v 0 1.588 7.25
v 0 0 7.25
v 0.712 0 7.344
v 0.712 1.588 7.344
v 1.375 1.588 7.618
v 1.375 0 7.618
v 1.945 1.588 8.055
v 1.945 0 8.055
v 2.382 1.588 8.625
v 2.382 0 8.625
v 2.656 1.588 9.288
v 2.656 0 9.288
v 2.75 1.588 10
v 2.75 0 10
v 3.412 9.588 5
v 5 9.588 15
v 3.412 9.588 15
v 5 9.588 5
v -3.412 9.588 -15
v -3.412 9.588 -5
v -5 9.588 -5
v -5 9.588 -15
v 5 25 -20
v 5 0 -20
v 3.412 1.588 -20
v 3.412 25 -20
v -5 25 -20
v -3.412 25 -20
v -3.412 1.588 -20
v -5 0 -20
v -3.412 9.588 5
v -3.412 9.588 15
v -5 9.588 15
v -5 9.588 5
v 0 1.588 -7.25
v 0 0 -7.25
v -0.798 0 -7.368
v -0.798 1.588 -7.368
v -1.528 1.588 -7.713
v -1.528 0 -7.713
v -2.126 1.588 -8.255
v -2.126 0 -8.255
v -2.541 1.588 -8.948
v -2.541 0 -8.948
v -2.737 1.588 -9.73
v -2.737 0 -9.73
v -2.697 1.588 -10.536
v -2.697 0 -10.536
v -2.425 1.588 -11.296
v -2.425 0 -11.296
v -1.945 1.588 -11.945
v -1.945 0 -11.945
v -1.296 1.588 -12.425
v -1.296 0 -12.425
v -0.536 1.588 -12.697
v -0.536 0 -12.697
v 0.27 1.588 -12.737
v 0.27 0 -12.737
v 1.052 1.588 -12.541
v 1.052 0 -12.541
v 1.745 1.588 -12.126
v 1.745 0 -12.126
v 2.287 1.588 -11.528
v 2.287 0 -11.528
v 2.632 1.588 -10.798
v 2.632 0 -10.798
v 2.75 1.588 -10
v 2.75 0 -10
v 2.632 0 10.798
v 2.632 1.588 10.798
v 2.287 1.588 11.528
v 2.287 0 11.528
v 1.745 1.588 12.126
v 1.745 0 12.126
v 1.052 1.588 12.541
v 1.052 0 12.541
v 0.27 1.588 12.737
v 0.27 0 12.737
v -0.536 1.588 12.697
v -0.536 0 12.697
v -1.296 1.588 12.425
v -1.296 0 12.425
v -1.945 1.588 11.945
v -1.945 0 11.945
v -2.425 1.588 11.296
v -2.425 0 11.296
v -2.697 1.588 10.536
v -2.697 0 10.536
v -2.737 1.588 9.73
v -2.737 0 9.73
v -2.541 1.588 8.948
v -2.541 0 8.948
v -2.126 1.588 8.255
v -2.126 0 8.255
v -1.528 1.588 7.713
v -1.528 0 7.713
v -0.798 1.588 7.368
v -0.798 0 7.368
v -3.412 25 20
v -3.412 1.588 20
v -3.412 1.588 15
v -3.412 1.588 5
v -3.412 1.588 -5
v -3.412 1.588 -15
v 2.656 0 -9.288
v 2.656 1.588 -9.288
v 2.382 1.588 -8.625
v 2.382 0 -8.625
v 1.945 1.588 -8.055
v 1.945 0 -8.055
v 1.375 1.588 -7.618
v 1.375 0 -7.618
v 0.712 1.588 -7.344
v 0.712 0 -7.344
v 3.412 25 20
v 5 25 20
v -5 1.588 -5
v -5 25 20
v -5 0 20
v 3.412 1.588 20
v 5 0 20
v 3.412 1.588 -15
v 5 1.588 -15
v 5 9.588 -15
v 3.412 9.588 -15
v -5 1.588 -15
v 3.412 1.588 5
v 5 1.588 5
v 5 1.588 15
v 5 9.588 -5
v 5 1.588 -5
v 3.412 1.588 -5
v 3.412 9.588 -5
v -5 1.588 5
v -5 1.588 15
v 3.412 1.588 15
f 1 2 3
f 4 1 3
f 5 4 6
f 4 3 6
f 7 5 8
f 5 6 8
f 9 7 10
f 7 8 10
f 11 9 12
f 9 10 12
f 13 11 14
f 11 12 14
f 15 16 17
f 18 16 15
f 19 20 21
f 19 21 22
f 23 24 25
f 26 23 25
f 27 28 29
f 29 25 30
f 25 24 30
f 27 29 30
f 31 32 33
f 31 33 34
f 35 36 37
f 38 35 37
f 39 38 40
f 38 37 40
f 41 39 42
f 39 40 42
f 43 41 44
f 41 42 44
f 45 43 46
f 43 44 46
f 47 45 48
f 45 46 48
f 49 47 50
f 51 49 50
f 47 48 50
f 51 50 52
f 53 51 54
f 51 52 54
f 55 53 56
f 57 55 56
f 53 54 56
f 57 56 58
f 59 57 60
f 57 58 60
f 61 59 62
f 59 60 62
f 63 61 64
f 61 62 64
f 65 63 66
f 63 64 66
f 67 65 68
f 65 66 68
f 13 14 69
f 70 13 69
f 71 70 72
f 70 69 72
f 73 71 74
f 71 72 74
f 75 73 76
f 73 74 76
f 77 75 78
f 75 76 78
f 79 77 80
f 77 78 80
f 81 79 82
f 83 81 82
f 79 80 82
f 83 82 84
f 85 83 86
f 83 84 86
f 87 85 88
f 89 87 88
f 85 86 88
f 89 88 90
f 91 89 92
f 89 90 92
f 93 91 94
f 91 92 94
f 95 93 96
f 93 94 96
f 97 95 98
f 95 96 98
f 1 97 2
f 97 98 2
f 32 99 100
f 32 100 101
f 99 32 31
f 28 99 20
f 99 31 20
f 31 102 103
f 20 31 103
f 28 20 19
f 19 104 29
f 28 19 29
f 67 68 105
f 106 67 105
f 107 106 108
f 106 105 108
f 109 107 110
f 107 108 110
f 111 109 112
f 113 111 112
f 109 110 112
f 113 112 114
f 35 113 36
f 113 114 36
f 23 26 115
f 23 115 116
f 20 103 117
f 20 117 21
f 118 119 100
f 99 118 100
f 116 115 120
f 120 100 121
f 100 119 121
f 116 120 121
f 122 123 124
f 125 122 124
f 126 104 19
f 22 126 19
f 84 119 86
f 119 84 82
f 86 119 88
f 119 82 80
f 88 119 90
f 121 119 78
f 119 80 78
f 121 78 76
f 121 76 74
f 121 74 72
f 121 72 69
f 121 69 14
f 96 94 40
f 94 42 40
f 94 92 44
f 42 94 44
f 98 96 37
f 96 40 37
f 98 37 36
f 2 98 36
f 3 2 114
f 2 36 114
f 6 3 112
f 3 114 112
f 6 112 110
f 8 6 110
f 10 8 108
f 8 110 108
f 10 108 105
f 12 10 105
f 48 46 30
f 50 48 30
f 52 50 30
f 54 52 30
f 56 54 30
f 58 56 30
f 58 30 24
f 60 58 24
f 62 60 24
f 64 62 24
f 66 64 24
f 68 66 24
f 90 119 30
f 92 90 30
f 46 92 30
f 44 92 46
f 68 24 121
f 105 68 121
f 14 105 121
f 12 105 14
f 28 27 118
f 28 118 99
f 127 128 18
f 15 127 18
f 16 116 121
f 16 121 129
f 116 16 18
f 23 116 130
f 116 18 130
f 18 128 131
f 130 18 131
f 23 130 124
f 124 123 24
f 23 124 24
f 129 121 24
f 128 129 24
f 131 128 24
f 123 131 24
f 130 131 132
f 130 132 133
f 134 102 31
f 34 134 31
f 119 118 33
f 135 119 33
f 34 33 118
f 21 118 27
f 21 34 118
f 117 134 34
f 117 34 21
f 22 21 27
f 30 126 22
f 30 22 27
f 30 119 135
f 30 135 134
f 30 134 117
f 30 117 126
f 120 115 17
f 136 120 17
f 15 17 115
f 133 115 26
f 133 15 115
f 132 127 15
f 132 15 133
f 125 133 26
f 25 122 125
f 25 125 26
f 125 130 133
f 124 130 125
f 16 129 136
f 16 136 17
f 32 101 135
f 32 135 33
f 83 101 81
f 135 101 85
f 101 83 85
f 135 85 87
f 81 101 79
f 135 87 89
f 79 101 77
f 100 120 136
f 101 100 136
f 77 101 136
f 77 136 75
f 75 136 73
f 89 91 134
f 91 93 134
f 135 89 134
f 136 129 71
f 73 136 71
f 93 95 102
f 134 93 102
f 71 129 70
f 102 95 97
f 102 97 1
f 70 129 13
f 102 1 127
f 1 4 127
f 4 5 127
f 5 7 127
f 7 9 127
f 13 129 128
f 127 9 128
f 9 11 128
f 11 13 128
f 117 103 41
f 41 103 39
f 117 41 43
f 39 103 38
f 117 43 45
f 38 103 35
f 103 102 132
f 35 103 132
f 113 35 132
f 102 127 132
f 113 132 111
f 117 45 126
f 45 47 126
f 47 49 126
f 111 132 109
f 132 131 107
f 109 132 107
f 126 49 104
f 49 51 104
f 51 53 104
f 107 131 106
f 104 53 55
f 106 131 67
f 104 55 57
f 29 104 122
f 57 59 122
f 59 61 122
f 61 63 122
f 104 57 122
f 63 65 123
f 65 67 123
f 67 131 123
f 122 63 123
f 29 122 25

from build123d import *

# Parameters (mm, degrees)
SKETCH1_W           = 10
SKETCH1_H           = 40
SKETCH1_R           = 2.75
BOSS_EXTRUDE1_DEPTH = 1.5875
SKETCH1_3_W         = 1.5875
SKETCH1_3_H         = 40
BOSS_EXTRUDE2_DEPTH = 25
SKETCH2_W           = 10
SKETCH2_H           = 8
CUT_EXTRUDE1_DEPTH  = 34.541019662


with BuildPart() as part:
    # Sketch1 → Boss-Extrude1 (new body)
    with BuildSketch(Plane(origin=(0, 0, 0), x_dir=(1, 0, 0), z_dir=(0, 1, 0))):
        Rectangle(SKETCH1_W, SKETCH1_H)
        with Locations((0, -10)):
            Circle(SKETCH1_R, mode=Mode.SUBTRACT)
        with Locations((0, 10)):
            Circle(SKETCH1_R, mode=Mode.SUBTRACT)
    extrude(amount=BOSS_EXTRUDE1_DEPTH)

    # Sketch1<3> → Boss-Extrude2 (add)
    with BuildSketch(Plane(origin=(0, 0, 0), x_dir=(1, 0, 0), z_dir=(0, 1, 0))):
        with Locations((-4.20625, 0)):
            Rectangle(SKETCH1_3_W, SKETCH1_3_H)
        with Locations((4.20625, 0)):
            Rectangle(SKETCH1_3_W, SKETCH1_3_H)
    extrude(amount=BOSS_EXTRUDE2_DEPTH)

    # Sketch2 → Cut-Extrude1 (cut, through all)
    with BuildSketch(Plane(origin=(5, 0, 0), x_dir=(0, 0, -1), z_dir=(1, 0, 0))):
        with Locations((-10, 5.5875)):
            Rectangle(SKETCH2_W, SKETCH2_H)
        with Locations((10, 5.5875)):
            Rectangle(SKETCH2_W, SKETCH2_H)
    extrude(amount=-CUT_EXTRUDE1_DEPTH, mode=Mode.SUBTRACT)


solid = part.part
